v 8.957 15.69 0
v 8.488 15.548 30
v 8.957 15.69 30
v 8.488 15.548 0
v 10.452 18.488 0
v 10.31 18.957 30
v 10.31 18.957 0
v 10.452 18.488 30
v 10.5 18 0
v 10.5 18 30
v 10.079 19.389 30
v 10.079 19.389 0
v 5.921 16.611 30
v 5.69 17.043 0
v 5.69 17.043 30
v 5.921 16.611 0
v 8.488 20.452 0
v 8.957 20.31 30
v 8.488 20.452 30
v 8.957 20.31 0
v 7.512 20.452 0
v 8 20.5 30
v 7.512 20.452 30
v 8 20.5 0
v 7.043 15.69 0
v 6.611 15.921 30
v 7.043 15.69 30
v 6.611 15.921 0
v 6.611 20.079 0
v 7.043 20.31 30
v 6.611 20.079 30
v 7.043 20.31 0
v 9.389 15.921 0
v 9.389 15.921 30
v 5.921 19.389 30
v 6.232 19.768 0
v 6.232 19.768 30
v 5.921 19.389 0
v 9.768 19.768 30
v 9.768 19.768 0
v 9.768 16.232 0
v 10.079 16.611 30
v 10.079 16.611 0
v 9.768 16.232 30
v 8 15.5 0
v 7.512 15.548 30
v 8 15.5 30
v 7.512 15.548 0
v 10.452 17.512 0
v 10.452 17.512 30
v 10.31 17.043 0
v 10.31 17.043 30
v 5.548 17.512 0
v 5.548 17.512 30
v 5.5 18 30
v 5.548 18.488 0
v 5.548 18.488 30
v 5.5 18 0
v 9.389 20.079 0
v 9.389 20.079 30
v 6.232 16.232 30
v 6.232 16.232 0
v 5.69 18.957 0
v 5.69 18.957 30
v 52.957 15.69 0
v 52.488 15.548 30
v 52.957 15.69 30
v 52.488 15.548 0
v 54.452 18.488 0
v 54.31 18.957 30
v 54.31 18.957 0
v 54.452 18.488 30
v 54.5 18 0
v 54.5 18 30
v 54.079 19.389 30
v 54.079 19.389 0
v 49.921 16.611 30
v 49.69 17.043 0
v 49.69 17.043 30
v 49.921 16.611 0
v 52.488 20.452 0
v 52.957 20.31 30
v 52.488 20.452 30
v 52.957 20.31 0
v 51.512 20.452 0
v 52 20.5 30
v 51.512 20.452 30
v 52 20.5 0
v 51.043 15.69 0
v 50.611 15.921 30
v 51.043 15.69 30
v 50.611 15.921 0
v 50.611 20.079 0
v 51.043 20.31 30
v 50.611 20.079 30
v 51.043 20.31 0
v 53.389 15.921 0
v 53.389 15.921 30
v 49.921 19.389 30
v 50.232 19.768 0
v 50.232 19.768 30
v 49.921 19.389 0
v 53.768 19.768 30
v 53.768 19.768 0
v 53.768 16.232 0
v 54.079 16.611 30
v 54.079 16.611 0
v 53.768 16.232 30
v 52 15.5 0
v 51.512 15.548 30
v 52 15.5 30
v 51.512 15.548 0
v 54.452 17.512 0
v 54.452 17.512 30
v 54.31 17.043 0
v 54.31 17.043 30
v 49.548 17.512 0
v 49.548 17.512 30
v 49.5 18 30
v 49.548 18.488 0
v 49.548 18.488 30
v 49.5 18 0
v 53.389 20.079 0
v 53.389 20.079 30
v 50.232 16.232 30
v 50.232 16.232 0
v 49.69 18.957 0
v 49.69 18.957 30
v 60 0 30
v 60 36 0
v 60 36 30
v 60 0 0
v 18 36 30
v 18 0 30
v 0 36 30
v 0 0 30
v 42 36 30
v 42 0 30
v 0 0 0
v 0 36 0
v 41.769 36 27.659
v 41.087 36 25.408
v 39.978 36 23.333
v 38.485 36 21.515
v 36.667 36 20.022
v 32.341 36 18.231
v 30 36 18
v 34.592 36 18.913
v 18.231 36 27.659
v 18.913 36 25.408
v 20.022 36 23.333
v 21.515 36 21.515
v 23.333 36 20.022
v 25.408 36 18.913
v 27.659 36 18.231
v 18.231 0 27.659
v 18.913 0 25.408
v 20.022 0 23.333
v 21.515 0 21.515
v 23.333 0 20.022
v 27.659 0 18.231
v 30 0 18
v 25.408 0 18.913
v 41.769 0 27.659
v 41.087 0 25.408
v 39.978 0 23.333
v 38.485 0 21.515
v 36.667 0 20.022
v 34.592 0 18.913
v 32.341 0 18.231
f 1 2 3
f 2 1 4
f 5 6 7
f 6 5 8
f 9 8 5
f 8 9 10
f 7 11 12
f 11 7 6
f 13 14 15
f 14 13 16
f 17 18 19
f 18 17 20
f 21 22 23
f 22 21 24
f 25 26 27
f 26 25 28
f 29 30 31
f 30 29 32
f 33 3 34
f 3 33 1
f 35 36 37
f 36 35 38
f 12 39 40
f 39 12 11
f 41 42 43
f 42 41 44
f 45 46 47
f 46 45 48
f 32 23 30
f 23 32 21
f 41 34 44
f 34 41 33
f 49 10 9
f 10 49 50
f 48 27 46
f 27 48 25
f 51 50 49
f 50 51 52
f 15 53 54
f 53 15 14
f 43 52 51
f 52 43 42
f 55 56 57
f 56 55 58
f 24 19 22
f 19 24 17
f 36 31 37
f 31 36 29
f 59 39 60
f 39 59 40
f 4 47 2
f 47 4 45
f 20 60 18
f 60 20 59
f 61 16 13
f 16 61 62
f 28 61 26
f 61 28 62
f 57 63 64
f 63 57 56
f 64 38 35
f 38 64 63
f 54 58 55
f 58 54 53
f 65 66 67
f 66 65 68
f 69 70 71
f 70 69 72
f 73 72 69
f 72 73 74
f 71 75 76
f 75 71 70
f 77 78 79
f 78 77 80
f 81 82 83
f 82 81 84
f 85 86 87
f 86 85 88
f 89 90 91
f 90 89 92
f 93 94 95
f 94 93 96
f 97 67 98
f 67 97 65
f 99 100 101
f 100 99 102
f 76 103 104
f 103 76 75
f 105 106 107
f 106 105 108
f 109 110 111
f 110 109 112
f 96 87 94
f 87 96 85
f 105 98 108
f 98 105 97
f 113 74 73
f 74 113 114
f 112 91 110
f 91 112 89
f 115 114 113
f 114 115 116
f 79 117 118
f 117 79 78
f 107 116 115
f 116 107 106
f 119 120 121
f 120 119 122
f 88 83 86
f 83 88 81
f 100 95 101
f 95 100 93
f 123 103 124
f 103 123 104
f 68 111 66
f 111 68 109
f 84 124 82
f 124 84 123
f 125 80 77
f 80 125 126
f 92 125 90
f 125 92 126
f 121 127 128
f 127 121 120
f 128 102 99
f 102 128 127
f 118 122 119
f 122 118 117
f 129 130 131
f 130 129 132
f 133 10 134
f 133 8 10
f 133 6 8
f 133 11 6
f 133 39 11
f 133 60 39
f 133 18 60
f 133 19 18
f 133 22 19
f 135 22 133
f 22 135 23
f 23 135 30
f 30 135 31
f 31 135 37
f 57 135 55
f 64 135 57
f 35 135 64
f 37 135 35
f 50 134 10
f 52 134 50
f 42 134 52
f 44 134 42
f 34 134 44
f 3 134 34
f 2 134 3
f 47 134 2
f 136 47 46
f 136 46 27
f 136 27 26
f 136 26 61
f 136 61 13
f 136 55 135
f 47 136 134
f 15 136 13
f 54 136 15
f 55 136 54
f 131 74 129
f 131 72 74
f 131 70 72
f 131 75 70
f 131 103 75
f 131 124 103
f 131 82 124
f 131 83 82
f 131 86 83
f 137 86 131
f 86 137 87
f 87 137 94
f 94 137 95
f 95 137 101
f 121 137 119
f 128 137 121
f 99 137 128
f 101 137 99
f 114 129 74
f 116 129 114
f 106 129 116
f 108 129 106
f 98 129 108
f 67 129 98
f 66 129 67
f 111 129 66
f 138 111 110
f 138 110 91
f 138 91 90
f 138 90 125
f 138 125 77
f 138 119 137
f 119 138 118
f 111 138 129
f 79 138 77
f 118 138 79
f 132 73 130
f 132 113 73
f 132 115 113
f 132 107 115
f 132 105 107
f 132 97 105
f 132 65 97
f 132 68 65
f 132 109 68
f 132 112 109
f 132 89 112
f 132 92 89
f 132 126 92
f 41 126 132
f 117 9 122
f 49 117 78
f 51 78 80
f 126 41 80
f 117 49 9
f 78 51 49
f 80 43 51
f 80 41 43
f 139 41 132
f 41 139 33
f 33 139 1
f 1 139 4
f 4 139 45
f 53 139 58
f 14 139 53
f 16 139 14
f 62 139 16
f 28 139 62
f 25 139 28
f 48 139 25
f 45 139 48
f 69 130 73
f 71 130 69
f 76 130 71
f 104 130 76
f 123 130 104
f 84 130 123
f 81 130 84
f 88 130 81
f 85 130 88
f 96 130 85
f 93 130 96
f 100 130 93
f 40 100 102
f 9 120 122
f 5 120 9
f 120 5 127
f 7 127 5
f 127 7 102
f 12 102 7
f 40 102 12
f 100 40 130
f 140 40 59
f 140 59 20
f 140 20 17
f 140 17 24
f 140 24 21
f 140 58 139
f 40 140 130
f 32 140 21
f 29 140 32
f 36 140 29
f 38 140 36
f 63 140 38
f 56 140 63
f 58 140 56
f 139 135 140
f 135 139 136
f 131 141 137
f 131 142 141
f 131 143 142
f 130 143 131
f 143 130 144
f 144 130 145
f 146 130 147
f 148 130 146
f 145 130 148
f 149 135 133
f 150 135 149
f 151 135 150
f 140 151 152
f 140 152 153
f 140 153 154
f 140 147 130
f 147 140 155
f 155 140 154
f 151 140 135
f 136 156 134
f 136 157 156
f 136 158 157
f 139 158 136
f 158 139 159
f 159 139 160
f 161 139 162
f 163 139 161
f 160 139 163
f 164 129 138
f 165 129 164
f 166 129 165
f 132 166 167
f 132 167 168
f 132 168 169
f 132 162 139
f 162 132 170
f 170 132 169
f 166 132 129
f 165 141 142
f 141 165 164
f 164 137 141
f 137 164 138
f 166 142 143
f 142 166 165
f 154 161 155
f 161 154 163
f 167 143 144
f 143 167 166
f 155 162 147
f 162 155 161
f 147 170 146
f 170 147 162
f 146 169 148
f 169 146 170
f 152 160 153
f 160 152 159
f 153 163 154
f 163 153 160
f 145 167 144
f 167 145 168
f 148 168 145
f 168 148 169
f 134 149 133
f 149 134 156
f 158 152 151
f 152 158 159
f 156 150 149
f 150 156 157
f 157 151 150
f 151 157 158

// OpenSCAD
$fn = 32;

// ----------------------------------------------------------------------
// Saddle clamp: plain shaft clamp
// ----------------------------------------------------------------------

// --- parameters (mm) ---
blk_l = 60;               // block length, X
blk_w = 36;               // block width, Y
blk_h = 30;               // block height
clamp_r = 12;             // shaft groove radius
hole_r = 2.5;             // bolt hole radius
hole_m = 8;               // bolt hole margin from the ends

saw_depth = clamp_r + 3;  // saw kerf depth

difference() {
  cube([blk_l, blk_w, blk_h]);
  translate([blk_l / 2, -1, blk_h])
    rotate([-90, 0, 0])
      cylinder(h = blk_w + 2, r = clamp_r);
  for (sx = [0, 1])
    translate([sx ? blk_l - hole_m : hole_m, blk_w / 2, -1])
      cylinder(r = hole_r, h = blk_h + 2);
}
